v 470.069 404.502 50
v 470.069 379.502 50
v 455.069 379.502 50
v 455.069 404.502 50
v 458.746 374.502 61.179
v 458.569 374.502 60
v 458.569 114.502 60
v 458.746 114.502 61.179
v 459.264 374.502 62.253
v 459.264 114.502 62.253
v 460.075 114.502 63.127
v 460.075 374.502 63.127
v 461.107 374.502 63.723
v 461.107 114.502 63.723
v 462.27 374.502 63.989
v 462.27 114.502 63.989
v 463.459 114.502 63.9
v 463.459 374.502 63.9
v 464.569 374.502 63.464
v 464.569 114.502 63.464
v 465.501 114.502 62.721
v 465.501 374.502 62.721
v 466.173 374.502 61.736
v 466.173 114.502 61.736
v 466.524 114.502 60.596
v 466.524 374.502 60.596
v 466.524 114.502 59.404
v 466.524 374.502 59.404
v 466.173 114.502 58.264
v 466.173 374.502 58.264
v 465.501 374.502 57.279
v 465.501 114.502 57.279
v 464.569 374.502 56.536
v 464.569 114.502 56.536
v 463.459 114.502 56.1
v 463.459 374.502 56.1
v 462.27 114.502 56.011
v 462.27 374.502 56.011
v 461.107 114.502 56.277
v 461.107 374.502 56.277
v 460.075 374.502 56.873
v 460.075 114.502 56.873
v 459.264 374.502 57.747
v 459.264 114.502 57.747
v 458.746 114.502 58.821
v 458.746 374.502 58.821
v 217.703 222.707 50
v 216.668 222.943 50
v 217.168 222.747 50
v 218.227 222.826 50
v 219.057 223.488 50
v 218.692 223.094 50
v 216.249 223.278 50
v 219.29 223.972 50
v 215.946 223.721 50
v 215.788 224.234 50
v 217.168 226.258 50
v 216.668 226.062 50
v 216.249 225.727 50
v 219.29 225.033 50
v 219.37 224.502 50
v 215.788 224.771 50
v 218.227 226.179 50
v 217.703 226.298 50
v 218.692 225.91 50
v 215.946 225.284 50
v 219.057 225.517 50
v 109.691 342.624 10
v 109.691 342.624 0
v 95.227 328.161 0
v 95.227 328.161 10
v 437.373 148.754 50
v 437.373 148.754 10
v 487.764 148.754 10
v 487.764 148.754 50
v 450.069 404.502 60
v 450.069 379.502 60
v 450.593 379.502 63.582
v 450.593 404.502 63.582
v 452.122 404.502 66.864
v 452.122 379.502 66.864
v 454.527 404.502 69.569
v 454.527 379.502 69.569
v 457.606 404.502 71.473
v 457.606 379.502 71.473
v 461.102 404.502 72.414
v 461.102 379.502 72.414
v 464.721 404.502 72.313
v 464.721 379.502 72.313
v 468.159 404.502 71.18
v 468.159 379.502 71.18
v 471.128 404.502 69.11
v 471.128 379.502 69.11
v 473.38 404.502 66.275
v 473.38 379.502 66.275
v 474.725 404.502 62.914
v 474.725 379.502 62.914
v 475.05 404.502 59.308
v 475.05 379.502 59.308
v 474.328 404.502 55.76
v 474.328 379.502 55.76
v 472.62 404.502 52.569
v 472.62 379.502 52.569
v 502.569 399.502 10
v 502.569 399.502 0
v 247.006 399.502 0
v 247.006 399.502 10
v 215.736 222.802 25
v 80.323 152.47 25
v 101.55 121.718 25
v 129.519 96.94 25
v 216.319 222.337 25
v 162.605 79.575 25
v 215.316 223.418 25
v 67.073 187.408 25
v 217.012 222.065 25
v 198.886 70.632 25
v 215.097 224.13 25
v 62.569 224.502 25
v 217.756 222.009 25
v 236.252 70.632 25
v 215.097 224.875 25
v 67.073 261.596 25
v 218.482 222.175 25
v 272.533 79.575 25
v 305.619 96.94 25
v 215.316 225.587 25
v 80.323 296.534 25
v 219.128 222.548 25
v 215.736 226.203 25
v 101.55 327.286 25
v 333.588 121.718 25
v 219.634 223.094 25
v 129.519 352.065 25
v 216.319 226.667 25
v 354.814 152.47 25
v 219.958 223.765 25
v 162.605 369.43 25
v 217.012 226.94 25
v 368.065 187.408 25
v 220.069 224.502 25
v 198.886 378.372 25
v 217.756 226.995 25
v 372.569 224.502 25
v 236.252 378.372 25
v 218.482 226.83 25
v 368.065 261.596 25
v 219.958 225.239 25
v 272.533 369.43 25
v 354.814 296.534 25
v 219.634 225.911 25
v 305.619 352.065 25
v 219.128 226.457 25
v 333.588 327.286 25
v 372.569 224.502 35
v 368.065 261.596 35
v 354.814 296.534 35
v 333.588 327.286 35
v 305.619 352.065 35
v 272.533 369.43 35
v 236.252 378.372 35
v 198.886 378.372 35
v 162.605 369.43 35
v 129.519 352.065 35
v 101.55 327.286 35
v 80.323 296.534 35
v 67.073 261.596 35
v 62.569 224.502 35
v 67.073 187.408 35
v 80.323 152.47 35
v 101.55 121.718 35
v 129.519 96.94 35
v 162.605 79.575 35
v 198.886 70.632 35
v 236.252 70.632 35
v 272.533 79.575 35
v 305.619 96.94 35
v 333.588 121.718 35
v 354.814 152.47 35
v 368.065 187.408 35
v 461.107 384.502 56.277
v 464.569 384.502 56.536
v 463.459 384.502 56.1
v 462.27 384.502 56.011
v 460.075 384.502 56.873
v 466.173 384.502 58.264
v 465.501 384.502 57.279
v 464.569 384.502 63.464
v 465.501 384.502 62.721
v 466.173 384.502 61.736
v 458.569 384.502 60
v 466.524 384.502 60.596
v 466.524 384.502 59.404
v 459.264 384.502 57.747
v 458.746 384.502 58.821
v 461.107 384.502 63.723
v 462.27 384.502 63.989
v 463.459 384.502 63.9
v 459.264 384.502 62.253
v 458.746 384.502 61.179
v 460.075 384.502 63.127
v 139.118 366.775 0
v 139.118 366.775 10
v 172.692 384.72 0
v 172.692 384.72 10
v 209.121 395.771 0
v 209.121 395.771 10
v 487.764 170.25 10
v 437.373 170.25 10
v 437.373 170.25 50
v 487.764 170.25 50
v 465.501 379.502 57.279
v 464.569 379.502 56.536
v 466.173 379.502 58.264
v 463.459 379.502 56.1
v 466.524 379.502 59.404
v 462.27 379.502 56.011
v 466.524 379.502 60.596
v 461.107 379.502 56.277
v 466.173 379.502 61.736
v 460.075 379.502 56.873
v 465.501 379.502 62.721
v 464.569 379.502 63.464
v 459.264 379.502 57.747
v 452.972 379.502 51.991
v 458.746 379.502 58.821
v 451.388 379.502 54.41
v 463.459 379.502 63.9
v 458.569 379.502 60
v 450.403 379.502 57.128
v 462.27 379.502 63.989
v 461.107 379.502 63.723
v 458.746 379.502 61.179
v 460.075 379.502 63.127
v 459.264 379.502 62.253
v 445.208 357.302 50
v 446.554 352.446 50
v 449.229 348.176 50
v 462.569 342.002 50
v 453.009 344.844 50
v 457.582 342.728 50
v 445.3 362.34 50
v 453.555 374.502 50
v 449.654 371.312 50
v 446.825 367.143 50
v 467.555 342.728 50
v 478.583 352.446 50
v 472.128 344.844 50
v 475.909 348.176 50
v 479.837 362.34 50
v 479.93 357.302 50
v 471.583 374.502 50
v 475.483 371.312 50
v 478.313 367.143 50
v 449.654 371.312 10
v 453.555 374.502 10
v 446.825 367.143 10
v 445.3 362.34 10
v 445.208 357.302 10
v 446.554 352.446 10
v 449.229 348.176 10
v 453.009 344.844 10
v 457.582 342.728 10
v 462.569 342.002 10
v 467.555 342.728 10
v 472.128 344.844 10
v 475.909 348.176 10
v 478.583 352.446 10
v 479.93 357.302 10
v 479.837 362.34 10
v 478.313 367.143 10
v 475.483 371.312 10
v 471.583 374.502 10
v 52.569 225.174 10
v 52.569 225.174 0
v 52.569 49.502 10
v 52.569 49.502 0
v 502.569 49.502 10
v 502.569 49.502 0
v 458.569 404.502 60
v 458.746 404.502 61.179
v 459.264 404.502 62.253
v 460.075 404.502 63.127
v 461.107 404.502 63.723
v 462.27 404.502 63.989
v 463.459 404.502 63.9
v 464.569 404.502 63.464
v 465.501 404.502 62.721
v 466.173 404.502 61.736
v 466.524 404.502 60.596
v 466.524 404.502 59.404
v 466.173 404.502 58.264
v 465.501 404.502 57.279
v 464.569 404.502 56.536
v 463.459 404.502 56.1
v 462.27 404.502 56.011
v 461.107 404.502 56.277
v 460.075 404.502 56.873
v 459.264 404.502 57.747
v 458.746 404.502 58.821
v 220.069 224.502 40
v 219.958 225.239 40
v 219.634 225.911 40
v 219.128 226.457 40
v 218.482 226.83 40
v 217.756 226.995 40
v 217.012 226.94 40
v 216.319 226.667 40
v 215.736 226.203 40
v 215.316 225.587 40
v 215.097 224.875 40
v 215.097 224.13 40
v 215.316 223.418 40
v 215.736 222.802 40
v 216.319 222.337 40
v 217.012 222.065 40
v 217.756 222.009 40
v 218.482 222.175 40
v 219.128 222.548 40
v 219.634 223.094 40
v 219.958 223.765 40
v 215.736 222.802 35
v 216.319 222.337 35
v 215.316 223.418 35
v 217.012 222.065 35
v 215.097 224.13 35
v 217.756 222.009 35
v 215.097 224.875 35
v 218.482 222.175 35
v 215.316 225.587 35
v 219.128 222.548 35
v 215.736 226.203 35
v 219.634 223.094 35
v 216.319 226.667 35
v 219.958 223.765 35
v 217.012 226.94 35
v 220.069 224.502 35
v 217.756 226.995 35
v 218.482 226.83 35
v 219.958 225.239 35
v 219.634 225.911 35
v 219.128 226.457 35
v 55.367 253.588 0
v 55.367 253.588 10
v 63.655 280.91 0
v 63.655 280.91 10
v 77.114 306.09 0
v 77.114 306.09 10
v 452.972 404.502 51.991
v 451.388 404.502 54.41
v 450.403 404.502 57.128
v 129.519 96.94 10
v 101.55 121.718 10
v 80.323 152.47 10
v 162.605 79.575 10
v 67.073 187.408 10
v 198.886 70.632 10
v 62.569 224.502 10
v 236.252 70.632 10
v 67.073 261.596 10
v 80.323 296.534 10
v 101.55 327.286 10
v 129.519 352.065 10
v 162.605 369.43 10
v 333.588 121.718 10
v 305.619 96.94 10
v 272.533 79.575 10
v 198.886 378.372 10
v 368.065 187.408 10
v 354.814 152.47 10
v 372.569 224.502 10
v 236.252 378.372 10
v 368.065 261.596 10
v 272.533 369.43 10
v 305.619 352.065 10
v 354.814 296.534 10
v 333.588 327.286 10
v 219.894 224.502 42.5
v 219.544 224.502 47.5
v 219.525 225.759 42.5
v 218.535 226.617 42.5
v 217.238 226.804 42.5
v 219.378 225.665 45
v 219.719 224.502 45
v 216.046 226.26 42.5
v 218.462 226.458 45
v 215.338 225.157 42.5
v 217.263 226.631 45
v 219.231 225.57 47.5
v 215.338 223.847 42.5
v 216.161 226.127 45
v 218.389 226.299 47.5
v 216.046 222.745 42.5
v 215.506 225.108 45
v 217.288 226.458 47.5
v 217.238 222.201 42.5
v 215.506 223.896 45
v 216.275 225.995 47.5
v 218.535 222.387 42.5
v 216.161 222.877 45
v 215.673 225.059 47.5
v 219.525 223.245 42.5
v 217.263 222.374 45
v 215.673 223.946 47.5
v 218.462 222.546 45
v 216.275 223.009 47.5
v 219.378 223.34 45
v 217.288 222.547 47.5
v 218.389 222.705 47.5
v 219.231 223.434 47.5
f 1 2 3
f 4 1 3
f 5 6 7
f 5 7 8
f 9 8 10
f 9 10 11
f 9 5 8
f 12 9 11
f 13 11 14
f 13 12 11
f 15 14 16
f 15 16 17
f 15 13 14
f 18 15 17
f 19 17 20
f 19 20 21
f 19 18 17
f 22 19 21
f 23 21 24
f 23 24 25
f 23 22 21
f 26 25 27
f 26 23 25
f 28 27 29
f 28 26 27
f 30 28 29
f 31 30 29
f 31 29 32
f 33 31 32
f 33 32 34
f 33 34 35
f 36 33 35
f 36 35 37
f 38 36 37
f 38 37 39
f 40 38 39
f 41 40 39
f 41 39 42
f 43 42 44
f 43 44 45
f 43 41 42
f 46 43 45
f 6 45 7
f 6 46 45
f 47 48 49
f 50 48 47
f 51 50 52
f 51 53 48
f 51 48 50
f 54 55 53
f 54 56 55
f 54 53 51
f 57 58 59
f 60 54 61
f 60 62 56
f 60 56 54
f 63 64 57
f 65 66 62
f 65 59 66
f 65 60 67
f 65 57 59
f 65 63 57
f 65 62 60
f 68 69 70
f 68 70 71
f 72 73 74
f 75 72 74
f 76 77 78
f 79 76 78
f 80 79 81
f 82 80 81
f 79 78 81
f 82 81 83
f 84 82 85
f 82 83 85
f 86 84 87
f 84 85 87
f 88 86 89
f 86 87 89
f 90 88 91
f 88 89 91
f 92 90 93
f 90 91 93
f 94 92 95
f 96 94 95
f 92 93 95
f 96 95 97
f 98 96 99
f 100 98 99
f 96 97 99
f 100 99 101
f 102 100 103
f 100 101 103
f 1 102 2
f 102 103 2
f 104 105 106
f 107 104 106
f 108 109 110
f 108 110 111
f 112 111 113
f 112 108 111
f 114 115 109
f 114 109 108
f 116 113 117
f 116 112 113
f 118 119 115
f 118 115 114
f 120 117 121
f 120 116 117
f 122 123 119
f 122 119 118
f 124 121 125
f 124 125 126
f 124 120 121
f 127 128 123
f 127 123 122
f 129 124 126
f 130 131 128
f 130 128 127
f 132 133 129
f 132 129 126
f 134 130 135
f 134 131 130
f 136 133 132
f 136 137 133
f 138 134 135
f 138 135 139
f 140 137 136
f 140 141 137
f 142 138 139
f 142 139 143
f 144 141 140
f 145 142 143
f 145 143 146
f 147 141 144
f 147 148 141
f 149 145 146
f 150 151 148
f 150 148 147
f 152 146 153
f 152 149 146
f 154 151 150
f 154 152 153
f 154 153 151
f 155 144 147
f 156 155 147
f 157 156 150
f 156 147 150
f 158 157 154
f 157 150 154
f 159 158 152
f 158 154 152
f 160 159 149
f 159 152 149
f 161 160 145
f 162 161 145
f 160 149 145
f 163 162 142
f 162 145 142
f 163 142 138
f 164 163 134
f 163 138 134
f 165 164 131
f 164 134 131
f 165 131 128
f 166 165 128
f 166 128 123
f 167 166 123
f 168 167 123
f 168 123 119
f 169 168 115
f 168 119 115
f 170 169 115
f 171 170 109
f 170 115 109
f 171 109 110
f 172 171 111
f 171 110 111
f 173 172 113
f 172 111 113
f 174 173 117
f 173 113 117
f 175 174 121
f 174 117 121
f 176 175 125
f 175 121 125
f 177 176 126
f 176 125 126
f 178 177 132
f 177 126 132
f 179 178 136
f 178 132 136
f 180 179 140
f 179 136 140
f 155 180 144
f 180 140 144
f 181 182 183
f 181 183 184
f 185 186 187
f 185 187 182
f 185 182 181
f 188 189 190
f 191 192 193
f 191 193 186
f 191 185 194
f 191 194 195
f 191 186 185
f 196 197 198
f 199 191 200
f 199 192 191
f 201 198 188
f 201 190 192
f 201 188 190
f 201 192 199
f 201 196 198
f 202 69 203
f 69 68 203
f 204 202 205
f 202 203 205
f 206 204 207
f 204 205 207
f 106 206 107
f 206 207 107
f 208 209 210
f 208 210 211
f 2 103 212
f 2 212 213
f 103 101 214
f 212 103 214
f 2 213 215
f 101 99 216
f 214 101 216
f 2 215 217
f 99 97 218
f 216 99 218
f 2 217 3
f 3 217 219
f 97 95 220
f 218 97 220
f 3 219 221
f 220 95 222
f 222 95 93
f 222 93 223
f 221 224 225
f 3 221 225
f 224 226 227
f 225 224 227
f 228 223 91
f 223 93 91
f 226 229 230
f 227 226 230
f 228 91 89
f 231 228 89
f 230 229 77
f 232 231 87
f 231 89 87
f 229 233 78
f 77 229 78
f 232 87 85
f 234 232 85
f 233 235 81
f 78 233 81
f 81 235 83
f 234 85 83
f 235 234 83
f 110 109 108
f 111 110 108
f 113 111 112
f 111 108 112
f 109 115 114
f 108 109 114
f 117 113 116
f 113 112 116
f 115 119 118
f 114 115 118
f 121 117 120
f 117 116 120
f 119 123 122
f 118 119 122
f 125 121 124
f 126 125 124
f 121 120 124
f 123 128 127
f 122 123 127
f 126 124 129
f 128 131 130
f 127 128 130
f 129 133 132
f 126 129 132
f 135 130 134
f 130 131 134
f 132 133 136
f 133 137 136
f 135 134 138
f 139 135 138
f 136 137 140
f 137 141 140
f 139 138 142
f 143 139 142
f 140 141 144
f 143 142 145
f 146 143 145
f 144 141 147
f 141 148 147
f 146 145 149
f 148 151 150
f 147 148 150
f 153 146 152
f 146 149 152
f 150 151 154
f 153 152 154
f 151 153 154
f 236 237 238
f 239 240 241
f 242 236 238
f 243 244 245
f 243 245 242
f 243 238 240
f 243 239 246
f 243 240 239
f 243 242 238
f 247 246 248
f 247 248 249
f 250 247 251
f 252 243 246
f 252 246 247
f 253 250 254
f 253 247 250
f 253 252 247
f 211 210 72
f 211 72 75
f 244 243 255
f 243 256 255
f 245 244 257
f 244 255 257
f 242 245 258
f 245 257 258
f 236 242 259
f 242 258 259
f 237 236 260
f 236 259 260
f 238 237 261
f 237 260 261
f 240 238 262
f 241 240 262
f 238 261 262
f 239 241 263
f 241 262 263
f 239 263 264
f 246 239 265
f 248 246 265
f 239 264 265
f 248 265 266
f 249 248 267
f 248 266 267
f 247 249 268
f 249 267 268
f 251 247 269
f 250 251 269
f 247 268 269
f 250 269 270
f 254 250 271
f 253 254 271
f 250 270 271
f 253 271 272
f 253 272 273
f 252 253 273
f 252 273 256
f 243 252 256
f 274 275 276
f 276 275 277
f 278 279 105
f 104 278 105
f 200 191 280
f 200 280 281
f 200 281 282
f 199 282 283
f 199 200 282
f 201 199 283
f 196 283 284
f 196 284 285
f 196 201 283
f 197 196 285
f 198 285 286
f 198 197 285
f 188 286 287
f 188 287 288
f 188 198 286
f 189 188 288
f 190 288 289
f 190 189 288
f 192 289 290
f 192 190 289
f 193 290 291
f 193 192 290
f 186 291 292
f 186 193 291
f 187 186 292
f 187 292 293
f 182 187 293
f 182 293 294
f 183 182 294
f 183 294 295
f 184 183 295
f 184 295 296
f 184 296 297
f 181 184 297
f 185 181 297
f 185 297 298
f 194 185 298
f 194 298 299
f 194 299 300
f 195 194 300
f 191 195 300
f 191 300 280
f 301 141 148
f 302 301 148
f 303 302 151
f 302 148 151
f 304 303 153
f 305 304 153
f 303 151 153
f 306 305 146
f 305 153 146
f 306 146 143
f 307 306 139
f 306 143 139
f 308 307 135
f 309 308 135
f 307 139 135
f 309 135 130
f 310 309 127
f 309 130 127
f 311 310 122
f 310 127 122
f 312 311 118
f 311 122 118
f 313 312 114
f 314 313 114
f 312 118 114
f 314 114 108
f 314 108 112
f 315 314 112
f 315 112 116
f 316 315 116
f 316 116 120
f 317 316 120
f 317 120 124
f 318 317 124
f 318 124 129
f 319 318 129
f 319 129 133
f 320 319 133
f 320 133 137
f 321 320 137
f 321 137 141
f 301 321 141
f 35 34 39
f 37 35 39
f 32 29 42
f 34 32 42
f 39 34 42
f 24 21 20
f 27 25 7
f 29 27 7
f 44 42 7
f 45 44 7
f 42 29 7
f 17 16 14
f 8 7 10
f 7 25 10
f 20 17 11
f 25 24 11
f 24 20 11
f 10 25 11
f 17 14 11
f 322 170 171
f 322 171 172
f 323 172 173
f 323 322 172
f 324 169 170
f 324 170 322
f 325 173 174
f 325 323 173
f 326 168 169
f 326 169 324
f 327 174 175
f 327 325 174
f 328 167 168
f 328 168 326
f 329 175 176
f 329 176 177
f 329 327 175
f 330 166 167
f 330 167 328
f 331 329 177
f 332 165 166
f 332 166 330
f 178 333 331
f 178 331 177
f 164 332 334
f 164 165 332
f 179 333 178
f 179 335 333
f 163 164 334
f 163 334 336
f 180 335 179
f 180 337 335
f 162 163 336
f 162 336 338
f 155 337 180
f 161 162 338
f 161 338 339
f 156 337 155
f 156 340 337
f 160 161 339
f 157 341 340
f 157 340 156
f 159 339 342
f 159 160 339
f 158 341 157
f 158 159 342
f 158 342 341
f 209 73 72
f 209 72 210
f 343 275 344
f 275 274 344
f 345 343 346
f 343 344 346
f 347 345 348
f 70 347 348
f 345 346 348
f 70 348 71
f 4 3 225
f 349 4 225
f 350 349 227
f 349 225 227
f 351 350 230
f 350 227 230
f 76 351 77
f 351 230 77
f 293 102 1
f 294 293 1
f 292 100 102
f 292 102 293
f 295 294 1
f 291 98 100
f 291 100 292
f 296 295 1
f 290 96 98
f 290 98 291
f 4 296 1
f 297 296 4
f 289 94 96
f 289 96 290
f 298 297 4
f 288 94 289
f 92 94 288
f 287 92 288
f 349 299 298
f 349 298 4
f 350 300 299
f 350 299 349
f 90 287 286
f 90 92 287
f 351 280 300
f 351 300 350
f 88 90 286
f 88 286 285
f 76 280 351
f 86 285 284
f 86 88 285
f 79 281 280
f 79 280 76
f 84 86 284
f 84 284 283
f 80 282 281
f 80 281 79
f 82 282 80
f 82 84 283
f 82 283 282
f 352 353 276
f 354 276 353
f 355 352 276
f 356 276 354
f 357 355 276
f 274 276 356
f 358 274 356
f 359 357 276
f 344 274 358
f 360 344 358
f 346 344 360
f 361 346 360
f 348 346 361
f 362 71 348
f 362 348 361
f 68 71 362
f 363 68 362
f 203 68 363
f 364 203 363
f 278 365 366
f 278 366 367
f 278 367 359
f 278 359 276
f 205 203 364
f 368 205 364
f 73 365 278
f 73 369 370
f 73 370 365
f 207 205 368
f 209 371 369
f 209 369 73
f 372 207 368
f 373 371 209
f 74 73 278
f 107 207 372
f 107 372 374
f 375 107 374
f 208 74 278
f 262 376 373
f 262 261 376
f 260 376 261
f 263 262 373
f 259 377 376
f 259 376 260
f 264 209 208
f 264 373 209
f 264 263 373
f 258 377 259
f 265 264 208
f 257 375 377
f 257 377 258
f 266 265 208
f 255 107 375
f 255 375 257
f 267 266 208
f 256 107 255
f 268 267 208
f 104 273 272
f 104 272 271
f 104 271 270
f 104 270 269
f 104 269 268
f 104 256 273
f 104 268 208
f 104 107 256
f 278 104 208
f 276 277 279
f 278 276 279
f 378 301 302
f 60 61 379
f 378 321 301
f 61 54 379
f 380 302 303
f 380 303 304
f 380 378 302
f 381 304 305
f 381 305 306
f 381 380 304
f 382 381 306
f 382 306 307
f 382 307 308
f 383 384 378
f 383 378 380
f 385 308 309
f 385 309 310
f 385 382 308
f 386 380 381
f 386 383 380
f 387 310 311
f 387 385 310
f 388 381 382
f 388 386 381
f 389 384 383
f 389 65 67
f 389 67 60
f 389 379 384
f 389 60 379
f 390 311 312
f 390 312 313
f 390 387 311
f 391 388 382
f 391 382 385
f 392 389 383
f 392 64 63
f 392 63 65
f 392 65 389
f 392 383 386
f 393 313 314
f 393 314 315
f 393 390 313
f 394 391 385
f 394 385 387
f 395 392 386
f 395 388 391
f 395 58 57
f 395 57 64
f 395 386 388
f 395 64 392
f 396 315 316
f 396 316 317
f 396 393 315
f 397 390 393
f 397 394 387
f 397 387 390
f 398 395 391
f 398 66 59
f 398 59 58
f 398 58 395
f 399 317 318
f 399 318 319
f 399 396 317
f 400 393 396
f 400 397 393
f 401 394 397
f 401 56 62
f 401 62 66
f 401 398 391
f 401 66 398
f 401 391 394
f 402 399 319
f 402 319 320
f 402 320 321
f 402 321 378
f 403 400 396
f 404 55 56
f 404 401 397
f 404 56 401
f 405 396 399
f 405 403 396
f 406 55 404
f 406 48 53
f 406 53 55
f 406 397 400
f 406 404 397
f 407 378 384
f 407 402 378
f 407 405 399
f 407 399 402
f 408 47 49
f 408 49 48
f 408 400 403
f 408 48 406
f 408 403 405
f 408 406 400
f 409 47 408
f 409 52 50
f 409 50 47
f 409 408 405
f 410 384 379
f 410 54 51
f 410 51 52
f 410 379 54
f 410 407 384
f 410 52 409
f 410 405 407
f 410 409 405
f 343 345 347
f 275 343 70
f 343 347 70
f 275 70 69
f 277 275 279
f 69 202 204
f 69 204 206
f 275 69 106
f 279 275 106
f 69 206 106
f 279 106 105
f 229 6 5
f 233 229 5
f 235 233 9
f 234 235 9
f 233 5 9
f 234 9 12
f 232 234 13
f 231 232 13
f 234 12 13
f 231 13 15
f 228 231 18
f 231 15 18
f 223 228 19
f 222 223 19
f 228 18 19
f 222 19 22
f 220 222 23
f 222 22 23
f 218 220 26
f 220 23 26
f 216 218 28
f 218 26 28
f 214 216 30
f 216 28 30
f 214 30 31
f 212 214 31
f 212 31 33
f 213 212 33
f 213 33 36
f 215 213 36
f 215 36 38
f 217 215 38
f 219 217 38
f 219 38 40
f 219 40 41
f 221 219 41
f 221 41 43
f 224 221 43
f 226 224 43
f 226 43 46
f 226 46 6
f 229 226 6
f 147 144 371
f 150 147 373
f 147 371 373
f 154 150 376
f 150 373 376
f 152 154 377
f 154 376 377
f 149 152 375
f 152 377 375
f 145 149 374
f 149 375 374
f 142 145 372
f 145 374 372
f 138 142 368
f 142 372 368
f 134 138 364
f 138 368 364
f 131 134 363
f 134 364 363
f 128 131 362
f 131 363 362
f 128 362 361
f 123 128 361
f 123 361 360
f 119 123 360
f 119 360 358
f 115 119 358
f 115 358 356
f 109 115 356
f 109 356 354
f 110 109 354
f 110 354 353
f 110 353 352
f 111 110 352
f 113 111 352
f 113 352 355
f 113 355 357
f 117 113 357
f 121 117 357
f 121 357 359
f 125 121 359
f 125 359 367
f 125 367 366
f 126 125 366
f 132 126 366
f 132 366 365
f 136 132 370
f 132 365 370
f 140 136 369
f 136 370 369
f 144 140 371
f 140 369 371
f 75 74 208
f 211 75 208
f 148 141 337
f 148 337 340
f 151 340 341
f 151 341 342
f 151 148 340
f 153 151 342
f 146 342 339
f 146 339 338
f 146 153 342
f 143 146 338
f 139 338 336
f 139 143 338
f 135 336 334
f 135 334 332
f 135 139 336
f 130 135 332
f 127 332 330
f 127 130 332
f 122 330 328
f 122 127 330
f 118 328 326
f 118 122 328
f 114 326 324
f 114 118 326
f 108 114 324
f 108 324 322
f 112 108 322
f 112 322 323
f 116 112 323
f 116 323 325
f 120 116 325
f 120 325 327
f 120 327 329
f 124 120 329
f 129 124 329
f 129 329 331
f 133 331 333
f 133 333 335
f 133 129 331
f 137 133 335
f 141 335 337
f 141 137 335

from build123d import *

# Parameters (mm, degrees)
F0_W          = 50.3910857439
F0_H          = 21.4959979057
F0_R          = 155
F0_R_2        = 2.5
F0_W_2        = 10
F0_H_2        = 10
F1_DEPTH      = 10
F2_DEPTH      = 25
F3_DEPTH      = 25
F5_START      = 5
F4_R          = 4
F5_DEPTH      = 25
F6_DEPTH      = 260
F6_DEPTH_BACK = 10
F7_DEPTH      = 40
F7_FACE_R     = 2.5
F8_DEPTH      = 10
F8_TAPER      = 4
F9_SIZE       = 114
F10_R         = 145.6448542145
F11_R         = 194.1931389527
F12_DEPTH     = 10


with BuildPart() as f1:
    # F0 (on Top) → F1 (new body)
    with BuildSketch(Plane.XY):
        Polygon((492.5687897205, 399.5023274422), (62.5687897205, 399.5023274422), (62.5687897205, 389.5023274422), (52.5687897205, 389.5023274422), (52.5687897205, 59.5023274422), (62.5687897205, 59.5023274422), (62.5687897205, 49.5023274422), (492.5687897205, 49.5023274422), (492.5687897205, 59.5023274422), (502.5687897205, 59.5023274422), (502.5687897205, 389.5023274422), (492.5687897205, 389.5023274422), align=None)
        with Locations((462.5687897205, 159.5023274422)):
            Rectangle(F0_W, F0_H, mode=Mode.SUBTRACT)
        with Locations((217.5687897205, 224.5023274422)):
            Circle(F0_R, mode=Mode.SUBTRACT)
        with BuildLine():
            ThreePointArc((471.5826679092, 374.5023274422), (462.5687897205, 342.0023274422), (453.5549115319, 374.5023274422))
            Line((453.5549115319, 374.5023274422), (471.5826679092, 374.5023274422))
        make_face(mode=Mode.SUBTRACT)
        with Locations((217.5687897205, 224.5023274422)):
            Circle(F0_R)
        with Locations((217.5687897205, 224.5023274422)):
            Circle(F0_R_2, mode=Mode.SUBTRACT)
        with Locations((462.5687897205, 159.5023274422)):
            Rectangle(F0_W, F0_H)
        with BuildLine():
            Line((471.5826679092, 374.5023274422), (453.5549115319, 374.5023274422))
            ThreePointArc((453.5549115319, 374.5023274422), (462.5687897205, 342.0023274422), (471.5826679092, 374.5023274422))
        make_face()
        with Locations((57.5687897205, 394.5023274422)):
            Rectangle(F0_W_2, F0_H_2)
        with Locations((497.5687897205, 394.5023274422)):
            Rectangle(F0_W_2, F0_H_2)
        with Locations((57.5687897205, 54.5023274422)):
            Rectangle(F0_W_2, F0_H_2)
        with Locations((497.5687897205, 54.5023274422)):
            Rectangle(F0_W_2, F0_H_2)
    extrude(amount=F1_DEPTH)

    # F0 (on Top) → F2 (join)
    with BuildSketch(Plane.XY):
        with BuildLine():
            Line((471.5826679092, 374.5023274422), (453.5549115319, 374.5023274422))
            ThreePointArc((453.5549115319, 374.5023274422), (462.5687897205, 342.0023274422), (471.5826679092, 374.5023274422))
        make_face()
        with Locations((462.5687897205, 159.5023274422)):
            Rectangle(F0_W, F0_H)
        with Locations((217.5687897205, 224.5023274422)):
            Circle(F0_R)
        with Locations((217.5687897205, 224.5023274422)):
            Circle(F0_R_2, mode=Mode.SUBTRACT)
    extrude(amount=F2_DEPTH)

    # F3 (add): faces of the model
    f3_faces = [f1.faces().sort_by_distance(p)[0] for p in [
        (462.5687897205, 358.9782324259, 25),
        (462.5687897205, 159.5023274422, 25),
    ]]
    extrude(f3_faces, amount=F3_DEPTH)

    # F0 (on Top) → F7 (join)
    with BuildSketch(Plane.XY):
        with Locations((217.5687897205, 224.5023274422)):
            Circle(F0_R_2)
    extrude(amount=F7_DEPTH)

    # F7_face (on face) → F8 (join)
    with BuildSketch(Plane(origin=(217.5687897205, 224.5023274422, 40), x_dir=(1, 0, 0), z_dir=(0, 0, 1))):
        Circle(F7_FACE_R)
    extrude(amount=F8_DEPTH, taper=F8_TAPER)

    # F9
    f9_edges = [f1.edges().sort_by_distance(p)[0] for p in [
        (52.56879, 399.502327, 5),
    ]]
    chamfer(f9_edges, length=F9_SIZE)

    # F10
    f10_edges = [f1.edges().sort_by_distance(p)[0] for p in [
        (52.56879, 285.502327, 5),
    ]]
    fillet(f10_edges, radius=F10_R)

    # F11
    f11_edges = [f1.edges().sort_by_distance(p)[0] for p in [
        (166.56879, 399.502327, 5),
    ]]
    fillet(f11_edges, radius=F11_R)


with BuildPart() as f5:
    # F4 (on face) → F5 (new body)
    with BuildSketch(Plane(origin=(0, 374.5023274422, 0), x_dir=(-1, 0, 0), z_dir=(0, 1, 0)).offset(F5_START)):
        with BuildLine():
            ThreePointArc((-455.0687897205, 50), (-451.388449833, 54.4098300563), (-450.0687897205, 60))
            ThreePointArc((-450.0687897205, 60), (-468.1589596643, 71.1803398875), (-470.0687897205, 50))
            Line((-470.0687897205, 50), (-455.0687897205, 50))
        make_face()
        with Locations((-462.5687897205, 60)):
            Circle(F4_R, mode=Mode.SUBTRACT)
    extrude(amount=F5_DEPTH)

    # F4 (on face) → F6 (join, two sides)
    with BuildSketch(Plane(origin=(0, 374.5023274422, 0), x_dir=(-1, 0, 0), z_dir=(0, 1, 0))) as f6_sk:
        with Locations((-462.5687897205, 60)):
            Circle(F4_R)
    extrude(amount=-F6_DEPTH)
    extrude(f6_sk.sketch, amount=F6_DEPTH_BACK)


with BuildPart() as f12:
    # F12 (new): a face of the model
    f12_faces = [f1.part.faces().sort_by_distance(p)[0] for p in [
        (66.9528517639, 224.5023274422, 25),
    ]]
    extrude(f12_faces, amount=F12_DEPTH)


solid = Compound([f1.part, f5.part, f12.part])
